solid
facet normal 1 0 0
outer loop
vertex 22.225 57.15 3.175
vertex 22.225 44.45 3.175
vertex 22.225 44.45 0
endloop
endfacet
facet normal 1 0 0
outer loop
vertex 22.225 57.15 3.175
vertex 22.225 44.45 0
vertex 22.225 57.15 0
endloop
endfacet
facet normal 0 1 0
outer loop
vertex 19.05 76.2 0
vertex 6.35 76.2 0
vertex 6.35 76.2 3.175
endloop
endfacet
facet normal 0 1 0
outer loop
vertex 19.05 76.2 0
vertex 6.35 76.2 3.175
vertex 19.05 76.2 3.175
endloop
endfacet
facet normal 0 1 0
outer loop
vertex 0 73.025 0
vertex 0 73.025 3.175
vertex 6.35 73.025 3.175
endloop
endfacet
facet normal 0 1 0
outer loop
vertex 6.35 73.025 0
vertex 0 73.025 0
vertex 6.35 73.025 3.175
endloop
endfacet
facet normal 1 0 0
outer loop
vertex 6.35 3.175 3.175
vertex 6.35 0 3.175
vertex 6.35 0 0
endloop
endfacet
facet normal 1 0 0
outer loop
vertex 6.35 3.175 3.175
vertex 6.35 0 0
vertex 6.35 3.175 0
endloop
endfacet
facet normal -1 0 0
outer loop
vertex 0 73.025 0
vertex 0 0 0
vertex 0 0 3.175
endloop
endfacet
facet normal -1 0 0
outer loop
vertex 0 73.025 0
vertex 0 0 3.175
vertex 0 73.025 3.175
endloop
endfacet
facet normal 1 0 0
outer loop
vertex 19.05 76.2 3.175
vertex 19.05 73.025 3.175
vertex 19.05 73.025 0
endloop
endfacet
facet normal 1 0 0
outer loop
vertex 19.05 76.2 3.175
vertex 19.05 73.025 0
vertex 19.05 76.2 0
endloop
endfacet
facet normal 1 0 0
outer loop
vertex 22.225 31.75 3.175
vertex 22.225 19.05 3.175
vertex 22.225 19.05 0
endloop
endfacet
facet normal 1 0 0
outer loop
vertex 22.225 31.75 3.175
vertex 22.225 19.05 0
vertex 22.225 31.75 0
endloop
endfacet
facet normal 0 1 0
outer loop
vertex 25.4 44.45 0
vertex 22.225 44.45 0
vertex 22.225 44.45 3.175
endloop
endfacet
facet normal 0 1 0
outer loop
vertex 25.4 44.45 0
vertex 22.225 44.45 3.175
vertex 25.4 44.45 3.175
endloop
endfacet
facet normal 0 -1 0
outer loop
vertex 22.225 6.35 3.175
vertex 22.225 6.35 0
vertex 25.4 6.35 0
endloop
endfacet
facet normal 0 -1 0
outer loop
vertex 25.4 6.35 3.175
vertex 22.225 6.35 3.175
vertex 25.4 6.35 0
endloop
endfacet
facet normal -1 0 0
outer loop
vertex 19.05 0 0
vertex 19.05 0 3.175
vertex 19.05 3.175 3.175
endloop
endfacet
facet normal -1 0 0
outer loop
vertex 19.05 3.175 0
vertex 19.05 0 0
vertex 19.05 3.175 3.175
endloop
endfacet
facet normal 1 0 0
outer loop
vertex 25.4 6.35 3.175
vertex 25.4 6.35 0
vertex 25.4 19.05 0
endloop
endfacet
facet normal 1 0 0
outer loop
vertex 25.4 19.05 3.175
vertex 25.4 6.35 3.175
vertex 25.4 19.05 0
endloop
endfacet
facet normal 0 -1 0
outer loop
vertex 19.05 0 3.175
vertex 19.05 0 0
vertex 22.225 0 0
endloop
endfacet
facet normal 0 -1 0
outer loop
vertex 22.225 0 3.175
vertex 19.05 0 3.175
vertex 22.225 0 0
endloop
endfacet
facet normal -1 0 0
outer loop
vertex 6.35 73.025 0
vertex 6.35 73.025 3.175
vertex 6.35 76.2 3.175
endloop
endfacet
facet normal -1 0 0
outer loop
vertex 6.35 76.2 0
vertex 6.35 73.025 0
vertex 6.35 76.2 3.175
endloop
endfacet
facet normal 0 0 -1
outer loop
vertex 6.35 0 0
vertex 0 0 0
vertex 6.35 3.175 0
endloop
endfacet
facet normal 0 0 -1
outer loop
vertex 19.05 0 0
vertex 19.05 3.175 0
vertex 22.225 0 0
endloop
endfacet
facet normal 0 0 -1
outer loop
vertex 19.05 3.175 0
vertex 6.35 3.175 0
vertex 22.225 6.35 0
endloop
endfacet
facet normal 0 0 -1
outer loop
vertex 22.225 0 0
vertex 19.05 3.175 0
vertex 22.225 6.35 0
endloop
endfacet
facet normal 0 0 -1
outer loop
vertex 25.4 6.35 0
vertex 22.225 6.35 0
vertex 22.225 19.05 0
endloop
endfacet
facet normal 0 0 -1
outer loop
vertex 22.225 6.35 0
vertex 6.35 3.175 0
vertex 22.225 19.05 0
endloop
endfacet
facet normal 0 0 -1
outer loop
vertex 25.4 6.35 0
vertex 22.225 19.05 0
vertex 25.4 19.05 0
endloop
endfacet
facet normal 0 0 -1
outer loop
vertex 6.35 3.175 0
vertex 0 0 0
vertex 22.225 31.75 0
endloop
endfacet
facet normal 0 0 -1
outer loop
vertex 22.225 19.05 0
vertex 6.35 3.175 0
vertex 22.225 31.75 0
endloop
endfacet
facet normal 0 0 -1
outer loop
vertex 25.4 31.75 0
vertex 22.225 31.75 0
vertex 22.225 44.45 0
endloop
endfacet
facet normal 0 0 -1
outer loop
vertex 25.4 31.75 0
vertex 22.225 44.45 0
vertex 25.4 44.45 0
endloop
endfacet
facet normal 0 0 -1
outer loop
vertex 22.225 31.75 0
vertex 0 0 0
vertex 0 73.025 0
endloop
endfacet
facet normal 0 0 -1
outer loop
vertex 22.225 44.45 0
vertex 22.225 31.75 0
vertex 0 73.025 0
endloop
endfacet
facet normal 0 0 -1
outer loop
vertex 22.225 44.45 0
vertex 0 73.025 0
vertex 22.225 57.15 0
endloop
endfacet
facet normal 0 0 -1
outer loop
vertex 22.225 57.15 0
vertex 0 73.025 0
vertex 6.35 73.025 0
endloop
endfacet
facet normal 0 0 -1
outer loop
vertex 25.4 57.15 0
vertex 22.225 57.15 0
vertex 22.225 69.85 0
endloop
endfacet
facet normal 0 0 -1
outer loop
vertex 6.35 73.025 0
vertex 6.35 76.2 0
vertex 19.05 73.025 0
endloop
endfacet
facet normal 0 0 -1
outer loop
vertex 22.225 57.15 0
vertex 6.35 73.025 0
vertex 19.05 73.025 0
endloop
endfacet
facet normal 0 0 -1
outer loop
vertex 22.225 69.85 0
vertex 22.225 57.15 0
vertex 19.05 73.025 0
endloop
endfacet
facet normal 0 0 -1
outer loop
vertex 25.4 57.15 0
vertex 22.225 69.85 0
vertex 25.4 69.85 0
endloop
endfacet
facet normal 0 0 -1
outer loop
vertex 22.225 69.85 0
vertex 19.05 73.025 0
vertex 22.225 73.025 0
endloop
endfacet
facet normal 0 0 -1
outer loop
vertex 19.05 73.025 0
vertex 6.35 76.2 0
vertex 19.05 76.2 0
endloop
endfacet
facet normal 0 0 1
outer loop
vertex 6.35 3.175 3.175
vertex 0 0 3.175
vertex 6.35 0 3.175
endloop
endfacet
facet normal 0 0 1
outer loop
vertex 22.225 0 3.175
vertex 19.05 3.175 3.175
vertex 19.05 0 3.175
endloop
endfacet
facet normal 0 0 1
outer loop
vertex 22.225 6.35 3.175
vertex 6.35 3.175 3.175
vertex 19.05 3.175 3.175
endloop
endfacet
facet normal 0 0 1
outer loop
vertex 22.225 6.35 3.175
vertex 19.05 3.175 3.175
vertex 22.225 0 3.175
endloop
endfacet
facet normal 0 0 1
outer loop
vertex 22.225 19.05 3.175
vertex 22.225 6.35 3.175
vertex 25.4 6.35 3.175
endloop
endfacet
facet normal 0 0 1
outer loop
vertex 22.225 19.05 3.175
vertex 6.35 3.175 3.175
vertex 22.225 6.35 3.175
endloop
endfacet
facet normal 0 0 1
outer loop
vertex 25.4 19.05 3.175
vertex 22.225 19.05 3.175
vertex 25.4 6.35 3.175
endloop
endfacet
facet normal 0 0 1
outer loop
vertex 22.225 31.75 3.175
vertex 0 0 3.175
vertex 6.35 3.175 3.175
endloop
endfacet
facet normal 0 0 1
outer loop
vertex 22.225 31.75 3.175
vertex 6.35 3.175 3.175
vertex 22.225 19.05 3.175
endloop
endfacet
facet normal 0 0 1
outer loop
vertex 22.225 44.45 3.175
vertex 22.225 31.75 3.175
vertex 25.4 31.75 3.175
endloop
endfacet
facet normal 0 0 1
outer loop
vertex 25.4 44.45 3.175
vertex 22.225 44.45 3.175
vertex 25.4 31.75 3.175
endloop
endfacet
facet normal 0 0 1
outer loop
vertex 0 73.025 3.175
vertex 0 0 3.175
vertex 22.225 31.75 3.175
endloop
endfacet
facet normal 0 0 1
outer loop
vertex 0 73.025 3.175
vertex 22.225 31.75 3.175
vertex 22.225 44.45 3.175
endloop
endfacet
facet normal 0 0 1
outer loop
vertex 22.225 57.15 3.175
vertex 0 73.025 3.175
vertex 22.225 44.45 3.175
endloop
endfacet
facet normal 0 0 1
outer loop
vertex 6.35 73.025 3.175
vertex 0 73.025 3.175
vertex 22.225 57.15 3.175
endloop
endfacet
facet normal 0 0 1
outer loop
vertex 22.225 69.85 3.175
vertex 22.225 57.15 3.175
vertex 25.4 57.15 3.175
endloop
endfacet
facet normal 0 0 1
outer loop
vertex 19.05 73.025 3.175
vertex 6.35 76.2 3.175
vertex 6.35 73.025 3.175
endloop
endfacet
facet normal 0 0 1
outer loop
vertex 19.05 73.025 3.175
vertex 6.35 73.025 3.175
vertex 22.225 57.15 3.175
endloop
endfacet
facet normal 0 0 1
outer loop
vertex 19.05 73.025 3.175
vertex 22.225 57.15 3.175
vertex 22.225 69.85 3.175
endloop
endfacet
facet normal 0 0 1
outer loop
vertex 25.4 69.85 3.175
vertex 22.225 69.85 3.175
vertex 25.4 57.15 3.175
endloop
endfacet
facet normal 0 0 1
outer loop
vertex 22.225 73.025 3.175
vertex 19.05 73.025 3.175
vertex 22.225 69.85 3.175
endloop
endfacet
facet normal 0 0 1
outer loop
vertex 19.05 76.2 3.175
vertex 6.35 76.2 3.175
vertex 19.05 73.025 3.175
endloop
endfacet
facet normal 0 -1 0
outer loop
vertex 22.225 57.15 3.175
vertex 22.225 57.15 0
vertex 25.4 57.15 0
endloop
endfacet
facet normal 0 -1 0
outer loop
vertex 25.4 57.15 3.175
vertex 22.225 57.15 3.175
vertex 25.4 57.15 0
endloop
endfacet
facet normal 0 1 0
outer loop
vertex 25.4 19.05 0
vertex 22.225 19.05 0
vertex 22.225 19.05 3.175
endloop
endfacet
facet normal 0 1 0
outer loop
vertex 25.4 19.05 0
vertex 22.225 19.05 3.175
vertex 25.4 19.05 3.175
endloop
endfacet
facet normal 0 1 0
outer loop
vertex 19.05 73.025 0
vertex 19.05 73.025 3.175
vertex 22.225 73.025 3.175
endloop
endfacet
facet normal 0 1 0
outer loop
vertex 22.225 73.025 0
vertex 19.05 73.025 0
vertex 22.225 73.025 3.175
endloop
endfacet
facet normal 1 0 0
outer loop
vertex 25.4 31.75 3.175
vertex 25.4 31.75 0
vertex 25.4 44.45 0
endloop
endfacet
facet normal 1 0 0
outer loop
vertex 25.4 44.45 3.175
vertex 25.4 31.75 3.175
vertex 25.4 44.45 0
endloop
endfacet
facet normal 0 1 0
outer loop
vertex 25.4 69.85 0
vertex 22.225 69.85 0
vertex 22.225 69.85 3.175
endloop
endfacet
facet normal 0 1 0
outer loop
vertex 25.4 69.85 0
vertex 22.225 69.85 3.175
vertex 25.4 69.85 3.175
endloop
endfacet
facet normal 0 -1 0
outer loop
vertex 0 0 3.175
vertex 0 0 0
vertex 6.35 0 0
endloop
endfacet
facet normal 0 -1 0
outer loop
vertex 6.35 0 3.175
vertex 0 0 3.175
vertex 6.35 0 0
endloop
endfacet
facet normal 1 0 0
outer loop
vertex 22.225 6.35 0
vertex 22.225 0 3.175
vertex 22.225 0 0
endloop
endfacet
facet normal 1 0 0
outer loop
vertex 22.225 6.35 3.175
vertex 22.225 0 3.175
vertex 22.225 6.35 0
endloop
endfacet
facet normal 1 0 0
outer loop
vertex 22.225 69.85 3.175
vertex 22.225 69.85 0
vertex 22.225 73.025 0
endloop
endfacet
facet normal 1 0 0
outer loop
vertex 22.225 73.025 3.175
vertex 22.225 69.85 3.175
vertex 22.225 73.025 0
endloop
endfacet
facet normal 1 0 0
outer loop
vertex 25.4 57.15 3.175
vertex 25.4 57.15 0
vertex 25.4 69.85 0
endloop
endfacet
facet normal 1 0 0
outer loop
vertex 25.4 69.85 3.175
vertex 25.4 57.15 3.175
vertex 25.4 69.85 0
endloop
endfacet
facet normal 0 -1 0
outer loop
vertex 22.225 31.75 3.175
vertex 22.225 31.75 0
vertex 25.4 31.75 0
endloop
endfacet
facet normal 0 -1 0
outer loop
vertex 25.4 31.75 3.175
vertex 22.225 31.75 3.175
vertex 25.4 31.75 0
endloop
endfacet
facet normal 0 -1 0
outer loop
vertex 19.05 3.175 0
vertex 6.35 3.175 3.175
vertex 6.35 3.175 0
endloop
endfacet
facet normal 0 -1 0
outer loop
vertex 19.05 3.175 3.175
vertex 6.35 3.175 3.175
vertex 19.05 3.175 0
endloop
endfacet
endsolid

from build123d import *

# Parameters (mm, degrees)
SKETCH1_W          = 25.4
SKETCH1_H          = 76.2
EXTRUDE1_DEPTH     = 3.175
SKETCH3_W          = 3.175
SKETCH3_H          = 6.35
CUT_EXTRUDE1_DEPTH = 3.175
LPATTERN1_COUNT    = 3
LPATTERN1_PITCH    = 69.85
SKETCH4_W          = 3.175
SKETCH4_H          = 12.7
CUT_EXTRUDE2_DEPTH = 3.175
LPATTERN2_COUNT    = 2
LPATTERN2_PITCH    = 25.4
SKETCH5_W          = 12.7
SKETCH5_H          = 3.175
CUT_EXTRUDE3_DEPTH = 3.175
SKETCH6_W          = 6.35
SKETCH6_H          = 3.175
CUT_EXTRUDE4_DEPTH = 3.175
LPATTERN3_COUNT    = 2
LPATTERN3_PITCH    = 19.05


with BuildPart() as part:
    # Sketch1 → Extrude1 (new body)
    with BuildSketch(Plane.XY):
        with Locations((12.7, 38.1)):
            Rectangle(SKETCH1_W, SKETCH1_H)
    extrude(amount=EXTRUDE1_DEPTH)

    # Sketch3 → Cut-Extrude1 (cut)
    with BuildSketch(Plane.XY.offset(3.175)):
        with Locations((23.8125, 73.025)):
            Rectangle(SKETCH3_W, SKETCH3_H)
    cut_extrude1 = extrude(amount=-CUT_EXTRUDE1_DEPTH, mode=Mode.SUBTRACT)

    # LPattern1: Cut-Extrude1 ×3
    with Locations(*[(0, -i * LPATTERN1_PITCH, 0) for i in range(1, LPATTERN1_COUNT)]):
        add(cut_extrude1, mode=Mode.SUBTRACT)

    # Sketch4 → Cut-Extrude2 (cut)
    with BuildSketch(Plane.XY.offset(3.175)):
        with Locations((23.8125, 50.8)):
            Rectangle(SKETCH4_W, SKETCH4_H)
    cut_extrude2 = extrude(amount=-CUT_EXTRUDE2_DEPTH, mode=Mode.SUBTRACT)

    # LPattern2: Cut-Extrude2 ×2
    with Locations(*[(0, -i * LPATTERN2_PITCH, 0) for i in range(1, LPATTERN2_COUNT)]):
        add(cut_extrude2, mode=Mode.SUBTRACT)

    # Sketch5 → Cut-Extrude3 (cut)
    with BuildSketch(Plane.XY.offset(3.175)):
        with Locations((12.7, 1.5875)):
            Rectangle(SKETCH5_W, SKETCH5_H)
    extrude(amount=-CUT_EXTRUDE3_DEPTH, mode=Mode.SUBTRACT)

    # Sketch6 → Cut-Extrude4 (cut)
    with BuildSketch(Plane.XY.offset(3.175)):
        with Locations((3.175, 74.6125)):
            Rectangle(SKETCH6_W, SKETCH6_H)
    cut_extrude4 = extrude(amount=-CUT_EXTRUDE4_DEPTH, mode=Mode.SUBTRACT)

    # LPattern3: Cut-Extrude4 ×2
    with Locations(*[(i * LPATTERN3_PITCH, 0, 0) for i in range(1, LPATTERN3_COUNT)]):
        add(cut_extrude4, mode=Mode.SUBTRACT)


solid = part.part
